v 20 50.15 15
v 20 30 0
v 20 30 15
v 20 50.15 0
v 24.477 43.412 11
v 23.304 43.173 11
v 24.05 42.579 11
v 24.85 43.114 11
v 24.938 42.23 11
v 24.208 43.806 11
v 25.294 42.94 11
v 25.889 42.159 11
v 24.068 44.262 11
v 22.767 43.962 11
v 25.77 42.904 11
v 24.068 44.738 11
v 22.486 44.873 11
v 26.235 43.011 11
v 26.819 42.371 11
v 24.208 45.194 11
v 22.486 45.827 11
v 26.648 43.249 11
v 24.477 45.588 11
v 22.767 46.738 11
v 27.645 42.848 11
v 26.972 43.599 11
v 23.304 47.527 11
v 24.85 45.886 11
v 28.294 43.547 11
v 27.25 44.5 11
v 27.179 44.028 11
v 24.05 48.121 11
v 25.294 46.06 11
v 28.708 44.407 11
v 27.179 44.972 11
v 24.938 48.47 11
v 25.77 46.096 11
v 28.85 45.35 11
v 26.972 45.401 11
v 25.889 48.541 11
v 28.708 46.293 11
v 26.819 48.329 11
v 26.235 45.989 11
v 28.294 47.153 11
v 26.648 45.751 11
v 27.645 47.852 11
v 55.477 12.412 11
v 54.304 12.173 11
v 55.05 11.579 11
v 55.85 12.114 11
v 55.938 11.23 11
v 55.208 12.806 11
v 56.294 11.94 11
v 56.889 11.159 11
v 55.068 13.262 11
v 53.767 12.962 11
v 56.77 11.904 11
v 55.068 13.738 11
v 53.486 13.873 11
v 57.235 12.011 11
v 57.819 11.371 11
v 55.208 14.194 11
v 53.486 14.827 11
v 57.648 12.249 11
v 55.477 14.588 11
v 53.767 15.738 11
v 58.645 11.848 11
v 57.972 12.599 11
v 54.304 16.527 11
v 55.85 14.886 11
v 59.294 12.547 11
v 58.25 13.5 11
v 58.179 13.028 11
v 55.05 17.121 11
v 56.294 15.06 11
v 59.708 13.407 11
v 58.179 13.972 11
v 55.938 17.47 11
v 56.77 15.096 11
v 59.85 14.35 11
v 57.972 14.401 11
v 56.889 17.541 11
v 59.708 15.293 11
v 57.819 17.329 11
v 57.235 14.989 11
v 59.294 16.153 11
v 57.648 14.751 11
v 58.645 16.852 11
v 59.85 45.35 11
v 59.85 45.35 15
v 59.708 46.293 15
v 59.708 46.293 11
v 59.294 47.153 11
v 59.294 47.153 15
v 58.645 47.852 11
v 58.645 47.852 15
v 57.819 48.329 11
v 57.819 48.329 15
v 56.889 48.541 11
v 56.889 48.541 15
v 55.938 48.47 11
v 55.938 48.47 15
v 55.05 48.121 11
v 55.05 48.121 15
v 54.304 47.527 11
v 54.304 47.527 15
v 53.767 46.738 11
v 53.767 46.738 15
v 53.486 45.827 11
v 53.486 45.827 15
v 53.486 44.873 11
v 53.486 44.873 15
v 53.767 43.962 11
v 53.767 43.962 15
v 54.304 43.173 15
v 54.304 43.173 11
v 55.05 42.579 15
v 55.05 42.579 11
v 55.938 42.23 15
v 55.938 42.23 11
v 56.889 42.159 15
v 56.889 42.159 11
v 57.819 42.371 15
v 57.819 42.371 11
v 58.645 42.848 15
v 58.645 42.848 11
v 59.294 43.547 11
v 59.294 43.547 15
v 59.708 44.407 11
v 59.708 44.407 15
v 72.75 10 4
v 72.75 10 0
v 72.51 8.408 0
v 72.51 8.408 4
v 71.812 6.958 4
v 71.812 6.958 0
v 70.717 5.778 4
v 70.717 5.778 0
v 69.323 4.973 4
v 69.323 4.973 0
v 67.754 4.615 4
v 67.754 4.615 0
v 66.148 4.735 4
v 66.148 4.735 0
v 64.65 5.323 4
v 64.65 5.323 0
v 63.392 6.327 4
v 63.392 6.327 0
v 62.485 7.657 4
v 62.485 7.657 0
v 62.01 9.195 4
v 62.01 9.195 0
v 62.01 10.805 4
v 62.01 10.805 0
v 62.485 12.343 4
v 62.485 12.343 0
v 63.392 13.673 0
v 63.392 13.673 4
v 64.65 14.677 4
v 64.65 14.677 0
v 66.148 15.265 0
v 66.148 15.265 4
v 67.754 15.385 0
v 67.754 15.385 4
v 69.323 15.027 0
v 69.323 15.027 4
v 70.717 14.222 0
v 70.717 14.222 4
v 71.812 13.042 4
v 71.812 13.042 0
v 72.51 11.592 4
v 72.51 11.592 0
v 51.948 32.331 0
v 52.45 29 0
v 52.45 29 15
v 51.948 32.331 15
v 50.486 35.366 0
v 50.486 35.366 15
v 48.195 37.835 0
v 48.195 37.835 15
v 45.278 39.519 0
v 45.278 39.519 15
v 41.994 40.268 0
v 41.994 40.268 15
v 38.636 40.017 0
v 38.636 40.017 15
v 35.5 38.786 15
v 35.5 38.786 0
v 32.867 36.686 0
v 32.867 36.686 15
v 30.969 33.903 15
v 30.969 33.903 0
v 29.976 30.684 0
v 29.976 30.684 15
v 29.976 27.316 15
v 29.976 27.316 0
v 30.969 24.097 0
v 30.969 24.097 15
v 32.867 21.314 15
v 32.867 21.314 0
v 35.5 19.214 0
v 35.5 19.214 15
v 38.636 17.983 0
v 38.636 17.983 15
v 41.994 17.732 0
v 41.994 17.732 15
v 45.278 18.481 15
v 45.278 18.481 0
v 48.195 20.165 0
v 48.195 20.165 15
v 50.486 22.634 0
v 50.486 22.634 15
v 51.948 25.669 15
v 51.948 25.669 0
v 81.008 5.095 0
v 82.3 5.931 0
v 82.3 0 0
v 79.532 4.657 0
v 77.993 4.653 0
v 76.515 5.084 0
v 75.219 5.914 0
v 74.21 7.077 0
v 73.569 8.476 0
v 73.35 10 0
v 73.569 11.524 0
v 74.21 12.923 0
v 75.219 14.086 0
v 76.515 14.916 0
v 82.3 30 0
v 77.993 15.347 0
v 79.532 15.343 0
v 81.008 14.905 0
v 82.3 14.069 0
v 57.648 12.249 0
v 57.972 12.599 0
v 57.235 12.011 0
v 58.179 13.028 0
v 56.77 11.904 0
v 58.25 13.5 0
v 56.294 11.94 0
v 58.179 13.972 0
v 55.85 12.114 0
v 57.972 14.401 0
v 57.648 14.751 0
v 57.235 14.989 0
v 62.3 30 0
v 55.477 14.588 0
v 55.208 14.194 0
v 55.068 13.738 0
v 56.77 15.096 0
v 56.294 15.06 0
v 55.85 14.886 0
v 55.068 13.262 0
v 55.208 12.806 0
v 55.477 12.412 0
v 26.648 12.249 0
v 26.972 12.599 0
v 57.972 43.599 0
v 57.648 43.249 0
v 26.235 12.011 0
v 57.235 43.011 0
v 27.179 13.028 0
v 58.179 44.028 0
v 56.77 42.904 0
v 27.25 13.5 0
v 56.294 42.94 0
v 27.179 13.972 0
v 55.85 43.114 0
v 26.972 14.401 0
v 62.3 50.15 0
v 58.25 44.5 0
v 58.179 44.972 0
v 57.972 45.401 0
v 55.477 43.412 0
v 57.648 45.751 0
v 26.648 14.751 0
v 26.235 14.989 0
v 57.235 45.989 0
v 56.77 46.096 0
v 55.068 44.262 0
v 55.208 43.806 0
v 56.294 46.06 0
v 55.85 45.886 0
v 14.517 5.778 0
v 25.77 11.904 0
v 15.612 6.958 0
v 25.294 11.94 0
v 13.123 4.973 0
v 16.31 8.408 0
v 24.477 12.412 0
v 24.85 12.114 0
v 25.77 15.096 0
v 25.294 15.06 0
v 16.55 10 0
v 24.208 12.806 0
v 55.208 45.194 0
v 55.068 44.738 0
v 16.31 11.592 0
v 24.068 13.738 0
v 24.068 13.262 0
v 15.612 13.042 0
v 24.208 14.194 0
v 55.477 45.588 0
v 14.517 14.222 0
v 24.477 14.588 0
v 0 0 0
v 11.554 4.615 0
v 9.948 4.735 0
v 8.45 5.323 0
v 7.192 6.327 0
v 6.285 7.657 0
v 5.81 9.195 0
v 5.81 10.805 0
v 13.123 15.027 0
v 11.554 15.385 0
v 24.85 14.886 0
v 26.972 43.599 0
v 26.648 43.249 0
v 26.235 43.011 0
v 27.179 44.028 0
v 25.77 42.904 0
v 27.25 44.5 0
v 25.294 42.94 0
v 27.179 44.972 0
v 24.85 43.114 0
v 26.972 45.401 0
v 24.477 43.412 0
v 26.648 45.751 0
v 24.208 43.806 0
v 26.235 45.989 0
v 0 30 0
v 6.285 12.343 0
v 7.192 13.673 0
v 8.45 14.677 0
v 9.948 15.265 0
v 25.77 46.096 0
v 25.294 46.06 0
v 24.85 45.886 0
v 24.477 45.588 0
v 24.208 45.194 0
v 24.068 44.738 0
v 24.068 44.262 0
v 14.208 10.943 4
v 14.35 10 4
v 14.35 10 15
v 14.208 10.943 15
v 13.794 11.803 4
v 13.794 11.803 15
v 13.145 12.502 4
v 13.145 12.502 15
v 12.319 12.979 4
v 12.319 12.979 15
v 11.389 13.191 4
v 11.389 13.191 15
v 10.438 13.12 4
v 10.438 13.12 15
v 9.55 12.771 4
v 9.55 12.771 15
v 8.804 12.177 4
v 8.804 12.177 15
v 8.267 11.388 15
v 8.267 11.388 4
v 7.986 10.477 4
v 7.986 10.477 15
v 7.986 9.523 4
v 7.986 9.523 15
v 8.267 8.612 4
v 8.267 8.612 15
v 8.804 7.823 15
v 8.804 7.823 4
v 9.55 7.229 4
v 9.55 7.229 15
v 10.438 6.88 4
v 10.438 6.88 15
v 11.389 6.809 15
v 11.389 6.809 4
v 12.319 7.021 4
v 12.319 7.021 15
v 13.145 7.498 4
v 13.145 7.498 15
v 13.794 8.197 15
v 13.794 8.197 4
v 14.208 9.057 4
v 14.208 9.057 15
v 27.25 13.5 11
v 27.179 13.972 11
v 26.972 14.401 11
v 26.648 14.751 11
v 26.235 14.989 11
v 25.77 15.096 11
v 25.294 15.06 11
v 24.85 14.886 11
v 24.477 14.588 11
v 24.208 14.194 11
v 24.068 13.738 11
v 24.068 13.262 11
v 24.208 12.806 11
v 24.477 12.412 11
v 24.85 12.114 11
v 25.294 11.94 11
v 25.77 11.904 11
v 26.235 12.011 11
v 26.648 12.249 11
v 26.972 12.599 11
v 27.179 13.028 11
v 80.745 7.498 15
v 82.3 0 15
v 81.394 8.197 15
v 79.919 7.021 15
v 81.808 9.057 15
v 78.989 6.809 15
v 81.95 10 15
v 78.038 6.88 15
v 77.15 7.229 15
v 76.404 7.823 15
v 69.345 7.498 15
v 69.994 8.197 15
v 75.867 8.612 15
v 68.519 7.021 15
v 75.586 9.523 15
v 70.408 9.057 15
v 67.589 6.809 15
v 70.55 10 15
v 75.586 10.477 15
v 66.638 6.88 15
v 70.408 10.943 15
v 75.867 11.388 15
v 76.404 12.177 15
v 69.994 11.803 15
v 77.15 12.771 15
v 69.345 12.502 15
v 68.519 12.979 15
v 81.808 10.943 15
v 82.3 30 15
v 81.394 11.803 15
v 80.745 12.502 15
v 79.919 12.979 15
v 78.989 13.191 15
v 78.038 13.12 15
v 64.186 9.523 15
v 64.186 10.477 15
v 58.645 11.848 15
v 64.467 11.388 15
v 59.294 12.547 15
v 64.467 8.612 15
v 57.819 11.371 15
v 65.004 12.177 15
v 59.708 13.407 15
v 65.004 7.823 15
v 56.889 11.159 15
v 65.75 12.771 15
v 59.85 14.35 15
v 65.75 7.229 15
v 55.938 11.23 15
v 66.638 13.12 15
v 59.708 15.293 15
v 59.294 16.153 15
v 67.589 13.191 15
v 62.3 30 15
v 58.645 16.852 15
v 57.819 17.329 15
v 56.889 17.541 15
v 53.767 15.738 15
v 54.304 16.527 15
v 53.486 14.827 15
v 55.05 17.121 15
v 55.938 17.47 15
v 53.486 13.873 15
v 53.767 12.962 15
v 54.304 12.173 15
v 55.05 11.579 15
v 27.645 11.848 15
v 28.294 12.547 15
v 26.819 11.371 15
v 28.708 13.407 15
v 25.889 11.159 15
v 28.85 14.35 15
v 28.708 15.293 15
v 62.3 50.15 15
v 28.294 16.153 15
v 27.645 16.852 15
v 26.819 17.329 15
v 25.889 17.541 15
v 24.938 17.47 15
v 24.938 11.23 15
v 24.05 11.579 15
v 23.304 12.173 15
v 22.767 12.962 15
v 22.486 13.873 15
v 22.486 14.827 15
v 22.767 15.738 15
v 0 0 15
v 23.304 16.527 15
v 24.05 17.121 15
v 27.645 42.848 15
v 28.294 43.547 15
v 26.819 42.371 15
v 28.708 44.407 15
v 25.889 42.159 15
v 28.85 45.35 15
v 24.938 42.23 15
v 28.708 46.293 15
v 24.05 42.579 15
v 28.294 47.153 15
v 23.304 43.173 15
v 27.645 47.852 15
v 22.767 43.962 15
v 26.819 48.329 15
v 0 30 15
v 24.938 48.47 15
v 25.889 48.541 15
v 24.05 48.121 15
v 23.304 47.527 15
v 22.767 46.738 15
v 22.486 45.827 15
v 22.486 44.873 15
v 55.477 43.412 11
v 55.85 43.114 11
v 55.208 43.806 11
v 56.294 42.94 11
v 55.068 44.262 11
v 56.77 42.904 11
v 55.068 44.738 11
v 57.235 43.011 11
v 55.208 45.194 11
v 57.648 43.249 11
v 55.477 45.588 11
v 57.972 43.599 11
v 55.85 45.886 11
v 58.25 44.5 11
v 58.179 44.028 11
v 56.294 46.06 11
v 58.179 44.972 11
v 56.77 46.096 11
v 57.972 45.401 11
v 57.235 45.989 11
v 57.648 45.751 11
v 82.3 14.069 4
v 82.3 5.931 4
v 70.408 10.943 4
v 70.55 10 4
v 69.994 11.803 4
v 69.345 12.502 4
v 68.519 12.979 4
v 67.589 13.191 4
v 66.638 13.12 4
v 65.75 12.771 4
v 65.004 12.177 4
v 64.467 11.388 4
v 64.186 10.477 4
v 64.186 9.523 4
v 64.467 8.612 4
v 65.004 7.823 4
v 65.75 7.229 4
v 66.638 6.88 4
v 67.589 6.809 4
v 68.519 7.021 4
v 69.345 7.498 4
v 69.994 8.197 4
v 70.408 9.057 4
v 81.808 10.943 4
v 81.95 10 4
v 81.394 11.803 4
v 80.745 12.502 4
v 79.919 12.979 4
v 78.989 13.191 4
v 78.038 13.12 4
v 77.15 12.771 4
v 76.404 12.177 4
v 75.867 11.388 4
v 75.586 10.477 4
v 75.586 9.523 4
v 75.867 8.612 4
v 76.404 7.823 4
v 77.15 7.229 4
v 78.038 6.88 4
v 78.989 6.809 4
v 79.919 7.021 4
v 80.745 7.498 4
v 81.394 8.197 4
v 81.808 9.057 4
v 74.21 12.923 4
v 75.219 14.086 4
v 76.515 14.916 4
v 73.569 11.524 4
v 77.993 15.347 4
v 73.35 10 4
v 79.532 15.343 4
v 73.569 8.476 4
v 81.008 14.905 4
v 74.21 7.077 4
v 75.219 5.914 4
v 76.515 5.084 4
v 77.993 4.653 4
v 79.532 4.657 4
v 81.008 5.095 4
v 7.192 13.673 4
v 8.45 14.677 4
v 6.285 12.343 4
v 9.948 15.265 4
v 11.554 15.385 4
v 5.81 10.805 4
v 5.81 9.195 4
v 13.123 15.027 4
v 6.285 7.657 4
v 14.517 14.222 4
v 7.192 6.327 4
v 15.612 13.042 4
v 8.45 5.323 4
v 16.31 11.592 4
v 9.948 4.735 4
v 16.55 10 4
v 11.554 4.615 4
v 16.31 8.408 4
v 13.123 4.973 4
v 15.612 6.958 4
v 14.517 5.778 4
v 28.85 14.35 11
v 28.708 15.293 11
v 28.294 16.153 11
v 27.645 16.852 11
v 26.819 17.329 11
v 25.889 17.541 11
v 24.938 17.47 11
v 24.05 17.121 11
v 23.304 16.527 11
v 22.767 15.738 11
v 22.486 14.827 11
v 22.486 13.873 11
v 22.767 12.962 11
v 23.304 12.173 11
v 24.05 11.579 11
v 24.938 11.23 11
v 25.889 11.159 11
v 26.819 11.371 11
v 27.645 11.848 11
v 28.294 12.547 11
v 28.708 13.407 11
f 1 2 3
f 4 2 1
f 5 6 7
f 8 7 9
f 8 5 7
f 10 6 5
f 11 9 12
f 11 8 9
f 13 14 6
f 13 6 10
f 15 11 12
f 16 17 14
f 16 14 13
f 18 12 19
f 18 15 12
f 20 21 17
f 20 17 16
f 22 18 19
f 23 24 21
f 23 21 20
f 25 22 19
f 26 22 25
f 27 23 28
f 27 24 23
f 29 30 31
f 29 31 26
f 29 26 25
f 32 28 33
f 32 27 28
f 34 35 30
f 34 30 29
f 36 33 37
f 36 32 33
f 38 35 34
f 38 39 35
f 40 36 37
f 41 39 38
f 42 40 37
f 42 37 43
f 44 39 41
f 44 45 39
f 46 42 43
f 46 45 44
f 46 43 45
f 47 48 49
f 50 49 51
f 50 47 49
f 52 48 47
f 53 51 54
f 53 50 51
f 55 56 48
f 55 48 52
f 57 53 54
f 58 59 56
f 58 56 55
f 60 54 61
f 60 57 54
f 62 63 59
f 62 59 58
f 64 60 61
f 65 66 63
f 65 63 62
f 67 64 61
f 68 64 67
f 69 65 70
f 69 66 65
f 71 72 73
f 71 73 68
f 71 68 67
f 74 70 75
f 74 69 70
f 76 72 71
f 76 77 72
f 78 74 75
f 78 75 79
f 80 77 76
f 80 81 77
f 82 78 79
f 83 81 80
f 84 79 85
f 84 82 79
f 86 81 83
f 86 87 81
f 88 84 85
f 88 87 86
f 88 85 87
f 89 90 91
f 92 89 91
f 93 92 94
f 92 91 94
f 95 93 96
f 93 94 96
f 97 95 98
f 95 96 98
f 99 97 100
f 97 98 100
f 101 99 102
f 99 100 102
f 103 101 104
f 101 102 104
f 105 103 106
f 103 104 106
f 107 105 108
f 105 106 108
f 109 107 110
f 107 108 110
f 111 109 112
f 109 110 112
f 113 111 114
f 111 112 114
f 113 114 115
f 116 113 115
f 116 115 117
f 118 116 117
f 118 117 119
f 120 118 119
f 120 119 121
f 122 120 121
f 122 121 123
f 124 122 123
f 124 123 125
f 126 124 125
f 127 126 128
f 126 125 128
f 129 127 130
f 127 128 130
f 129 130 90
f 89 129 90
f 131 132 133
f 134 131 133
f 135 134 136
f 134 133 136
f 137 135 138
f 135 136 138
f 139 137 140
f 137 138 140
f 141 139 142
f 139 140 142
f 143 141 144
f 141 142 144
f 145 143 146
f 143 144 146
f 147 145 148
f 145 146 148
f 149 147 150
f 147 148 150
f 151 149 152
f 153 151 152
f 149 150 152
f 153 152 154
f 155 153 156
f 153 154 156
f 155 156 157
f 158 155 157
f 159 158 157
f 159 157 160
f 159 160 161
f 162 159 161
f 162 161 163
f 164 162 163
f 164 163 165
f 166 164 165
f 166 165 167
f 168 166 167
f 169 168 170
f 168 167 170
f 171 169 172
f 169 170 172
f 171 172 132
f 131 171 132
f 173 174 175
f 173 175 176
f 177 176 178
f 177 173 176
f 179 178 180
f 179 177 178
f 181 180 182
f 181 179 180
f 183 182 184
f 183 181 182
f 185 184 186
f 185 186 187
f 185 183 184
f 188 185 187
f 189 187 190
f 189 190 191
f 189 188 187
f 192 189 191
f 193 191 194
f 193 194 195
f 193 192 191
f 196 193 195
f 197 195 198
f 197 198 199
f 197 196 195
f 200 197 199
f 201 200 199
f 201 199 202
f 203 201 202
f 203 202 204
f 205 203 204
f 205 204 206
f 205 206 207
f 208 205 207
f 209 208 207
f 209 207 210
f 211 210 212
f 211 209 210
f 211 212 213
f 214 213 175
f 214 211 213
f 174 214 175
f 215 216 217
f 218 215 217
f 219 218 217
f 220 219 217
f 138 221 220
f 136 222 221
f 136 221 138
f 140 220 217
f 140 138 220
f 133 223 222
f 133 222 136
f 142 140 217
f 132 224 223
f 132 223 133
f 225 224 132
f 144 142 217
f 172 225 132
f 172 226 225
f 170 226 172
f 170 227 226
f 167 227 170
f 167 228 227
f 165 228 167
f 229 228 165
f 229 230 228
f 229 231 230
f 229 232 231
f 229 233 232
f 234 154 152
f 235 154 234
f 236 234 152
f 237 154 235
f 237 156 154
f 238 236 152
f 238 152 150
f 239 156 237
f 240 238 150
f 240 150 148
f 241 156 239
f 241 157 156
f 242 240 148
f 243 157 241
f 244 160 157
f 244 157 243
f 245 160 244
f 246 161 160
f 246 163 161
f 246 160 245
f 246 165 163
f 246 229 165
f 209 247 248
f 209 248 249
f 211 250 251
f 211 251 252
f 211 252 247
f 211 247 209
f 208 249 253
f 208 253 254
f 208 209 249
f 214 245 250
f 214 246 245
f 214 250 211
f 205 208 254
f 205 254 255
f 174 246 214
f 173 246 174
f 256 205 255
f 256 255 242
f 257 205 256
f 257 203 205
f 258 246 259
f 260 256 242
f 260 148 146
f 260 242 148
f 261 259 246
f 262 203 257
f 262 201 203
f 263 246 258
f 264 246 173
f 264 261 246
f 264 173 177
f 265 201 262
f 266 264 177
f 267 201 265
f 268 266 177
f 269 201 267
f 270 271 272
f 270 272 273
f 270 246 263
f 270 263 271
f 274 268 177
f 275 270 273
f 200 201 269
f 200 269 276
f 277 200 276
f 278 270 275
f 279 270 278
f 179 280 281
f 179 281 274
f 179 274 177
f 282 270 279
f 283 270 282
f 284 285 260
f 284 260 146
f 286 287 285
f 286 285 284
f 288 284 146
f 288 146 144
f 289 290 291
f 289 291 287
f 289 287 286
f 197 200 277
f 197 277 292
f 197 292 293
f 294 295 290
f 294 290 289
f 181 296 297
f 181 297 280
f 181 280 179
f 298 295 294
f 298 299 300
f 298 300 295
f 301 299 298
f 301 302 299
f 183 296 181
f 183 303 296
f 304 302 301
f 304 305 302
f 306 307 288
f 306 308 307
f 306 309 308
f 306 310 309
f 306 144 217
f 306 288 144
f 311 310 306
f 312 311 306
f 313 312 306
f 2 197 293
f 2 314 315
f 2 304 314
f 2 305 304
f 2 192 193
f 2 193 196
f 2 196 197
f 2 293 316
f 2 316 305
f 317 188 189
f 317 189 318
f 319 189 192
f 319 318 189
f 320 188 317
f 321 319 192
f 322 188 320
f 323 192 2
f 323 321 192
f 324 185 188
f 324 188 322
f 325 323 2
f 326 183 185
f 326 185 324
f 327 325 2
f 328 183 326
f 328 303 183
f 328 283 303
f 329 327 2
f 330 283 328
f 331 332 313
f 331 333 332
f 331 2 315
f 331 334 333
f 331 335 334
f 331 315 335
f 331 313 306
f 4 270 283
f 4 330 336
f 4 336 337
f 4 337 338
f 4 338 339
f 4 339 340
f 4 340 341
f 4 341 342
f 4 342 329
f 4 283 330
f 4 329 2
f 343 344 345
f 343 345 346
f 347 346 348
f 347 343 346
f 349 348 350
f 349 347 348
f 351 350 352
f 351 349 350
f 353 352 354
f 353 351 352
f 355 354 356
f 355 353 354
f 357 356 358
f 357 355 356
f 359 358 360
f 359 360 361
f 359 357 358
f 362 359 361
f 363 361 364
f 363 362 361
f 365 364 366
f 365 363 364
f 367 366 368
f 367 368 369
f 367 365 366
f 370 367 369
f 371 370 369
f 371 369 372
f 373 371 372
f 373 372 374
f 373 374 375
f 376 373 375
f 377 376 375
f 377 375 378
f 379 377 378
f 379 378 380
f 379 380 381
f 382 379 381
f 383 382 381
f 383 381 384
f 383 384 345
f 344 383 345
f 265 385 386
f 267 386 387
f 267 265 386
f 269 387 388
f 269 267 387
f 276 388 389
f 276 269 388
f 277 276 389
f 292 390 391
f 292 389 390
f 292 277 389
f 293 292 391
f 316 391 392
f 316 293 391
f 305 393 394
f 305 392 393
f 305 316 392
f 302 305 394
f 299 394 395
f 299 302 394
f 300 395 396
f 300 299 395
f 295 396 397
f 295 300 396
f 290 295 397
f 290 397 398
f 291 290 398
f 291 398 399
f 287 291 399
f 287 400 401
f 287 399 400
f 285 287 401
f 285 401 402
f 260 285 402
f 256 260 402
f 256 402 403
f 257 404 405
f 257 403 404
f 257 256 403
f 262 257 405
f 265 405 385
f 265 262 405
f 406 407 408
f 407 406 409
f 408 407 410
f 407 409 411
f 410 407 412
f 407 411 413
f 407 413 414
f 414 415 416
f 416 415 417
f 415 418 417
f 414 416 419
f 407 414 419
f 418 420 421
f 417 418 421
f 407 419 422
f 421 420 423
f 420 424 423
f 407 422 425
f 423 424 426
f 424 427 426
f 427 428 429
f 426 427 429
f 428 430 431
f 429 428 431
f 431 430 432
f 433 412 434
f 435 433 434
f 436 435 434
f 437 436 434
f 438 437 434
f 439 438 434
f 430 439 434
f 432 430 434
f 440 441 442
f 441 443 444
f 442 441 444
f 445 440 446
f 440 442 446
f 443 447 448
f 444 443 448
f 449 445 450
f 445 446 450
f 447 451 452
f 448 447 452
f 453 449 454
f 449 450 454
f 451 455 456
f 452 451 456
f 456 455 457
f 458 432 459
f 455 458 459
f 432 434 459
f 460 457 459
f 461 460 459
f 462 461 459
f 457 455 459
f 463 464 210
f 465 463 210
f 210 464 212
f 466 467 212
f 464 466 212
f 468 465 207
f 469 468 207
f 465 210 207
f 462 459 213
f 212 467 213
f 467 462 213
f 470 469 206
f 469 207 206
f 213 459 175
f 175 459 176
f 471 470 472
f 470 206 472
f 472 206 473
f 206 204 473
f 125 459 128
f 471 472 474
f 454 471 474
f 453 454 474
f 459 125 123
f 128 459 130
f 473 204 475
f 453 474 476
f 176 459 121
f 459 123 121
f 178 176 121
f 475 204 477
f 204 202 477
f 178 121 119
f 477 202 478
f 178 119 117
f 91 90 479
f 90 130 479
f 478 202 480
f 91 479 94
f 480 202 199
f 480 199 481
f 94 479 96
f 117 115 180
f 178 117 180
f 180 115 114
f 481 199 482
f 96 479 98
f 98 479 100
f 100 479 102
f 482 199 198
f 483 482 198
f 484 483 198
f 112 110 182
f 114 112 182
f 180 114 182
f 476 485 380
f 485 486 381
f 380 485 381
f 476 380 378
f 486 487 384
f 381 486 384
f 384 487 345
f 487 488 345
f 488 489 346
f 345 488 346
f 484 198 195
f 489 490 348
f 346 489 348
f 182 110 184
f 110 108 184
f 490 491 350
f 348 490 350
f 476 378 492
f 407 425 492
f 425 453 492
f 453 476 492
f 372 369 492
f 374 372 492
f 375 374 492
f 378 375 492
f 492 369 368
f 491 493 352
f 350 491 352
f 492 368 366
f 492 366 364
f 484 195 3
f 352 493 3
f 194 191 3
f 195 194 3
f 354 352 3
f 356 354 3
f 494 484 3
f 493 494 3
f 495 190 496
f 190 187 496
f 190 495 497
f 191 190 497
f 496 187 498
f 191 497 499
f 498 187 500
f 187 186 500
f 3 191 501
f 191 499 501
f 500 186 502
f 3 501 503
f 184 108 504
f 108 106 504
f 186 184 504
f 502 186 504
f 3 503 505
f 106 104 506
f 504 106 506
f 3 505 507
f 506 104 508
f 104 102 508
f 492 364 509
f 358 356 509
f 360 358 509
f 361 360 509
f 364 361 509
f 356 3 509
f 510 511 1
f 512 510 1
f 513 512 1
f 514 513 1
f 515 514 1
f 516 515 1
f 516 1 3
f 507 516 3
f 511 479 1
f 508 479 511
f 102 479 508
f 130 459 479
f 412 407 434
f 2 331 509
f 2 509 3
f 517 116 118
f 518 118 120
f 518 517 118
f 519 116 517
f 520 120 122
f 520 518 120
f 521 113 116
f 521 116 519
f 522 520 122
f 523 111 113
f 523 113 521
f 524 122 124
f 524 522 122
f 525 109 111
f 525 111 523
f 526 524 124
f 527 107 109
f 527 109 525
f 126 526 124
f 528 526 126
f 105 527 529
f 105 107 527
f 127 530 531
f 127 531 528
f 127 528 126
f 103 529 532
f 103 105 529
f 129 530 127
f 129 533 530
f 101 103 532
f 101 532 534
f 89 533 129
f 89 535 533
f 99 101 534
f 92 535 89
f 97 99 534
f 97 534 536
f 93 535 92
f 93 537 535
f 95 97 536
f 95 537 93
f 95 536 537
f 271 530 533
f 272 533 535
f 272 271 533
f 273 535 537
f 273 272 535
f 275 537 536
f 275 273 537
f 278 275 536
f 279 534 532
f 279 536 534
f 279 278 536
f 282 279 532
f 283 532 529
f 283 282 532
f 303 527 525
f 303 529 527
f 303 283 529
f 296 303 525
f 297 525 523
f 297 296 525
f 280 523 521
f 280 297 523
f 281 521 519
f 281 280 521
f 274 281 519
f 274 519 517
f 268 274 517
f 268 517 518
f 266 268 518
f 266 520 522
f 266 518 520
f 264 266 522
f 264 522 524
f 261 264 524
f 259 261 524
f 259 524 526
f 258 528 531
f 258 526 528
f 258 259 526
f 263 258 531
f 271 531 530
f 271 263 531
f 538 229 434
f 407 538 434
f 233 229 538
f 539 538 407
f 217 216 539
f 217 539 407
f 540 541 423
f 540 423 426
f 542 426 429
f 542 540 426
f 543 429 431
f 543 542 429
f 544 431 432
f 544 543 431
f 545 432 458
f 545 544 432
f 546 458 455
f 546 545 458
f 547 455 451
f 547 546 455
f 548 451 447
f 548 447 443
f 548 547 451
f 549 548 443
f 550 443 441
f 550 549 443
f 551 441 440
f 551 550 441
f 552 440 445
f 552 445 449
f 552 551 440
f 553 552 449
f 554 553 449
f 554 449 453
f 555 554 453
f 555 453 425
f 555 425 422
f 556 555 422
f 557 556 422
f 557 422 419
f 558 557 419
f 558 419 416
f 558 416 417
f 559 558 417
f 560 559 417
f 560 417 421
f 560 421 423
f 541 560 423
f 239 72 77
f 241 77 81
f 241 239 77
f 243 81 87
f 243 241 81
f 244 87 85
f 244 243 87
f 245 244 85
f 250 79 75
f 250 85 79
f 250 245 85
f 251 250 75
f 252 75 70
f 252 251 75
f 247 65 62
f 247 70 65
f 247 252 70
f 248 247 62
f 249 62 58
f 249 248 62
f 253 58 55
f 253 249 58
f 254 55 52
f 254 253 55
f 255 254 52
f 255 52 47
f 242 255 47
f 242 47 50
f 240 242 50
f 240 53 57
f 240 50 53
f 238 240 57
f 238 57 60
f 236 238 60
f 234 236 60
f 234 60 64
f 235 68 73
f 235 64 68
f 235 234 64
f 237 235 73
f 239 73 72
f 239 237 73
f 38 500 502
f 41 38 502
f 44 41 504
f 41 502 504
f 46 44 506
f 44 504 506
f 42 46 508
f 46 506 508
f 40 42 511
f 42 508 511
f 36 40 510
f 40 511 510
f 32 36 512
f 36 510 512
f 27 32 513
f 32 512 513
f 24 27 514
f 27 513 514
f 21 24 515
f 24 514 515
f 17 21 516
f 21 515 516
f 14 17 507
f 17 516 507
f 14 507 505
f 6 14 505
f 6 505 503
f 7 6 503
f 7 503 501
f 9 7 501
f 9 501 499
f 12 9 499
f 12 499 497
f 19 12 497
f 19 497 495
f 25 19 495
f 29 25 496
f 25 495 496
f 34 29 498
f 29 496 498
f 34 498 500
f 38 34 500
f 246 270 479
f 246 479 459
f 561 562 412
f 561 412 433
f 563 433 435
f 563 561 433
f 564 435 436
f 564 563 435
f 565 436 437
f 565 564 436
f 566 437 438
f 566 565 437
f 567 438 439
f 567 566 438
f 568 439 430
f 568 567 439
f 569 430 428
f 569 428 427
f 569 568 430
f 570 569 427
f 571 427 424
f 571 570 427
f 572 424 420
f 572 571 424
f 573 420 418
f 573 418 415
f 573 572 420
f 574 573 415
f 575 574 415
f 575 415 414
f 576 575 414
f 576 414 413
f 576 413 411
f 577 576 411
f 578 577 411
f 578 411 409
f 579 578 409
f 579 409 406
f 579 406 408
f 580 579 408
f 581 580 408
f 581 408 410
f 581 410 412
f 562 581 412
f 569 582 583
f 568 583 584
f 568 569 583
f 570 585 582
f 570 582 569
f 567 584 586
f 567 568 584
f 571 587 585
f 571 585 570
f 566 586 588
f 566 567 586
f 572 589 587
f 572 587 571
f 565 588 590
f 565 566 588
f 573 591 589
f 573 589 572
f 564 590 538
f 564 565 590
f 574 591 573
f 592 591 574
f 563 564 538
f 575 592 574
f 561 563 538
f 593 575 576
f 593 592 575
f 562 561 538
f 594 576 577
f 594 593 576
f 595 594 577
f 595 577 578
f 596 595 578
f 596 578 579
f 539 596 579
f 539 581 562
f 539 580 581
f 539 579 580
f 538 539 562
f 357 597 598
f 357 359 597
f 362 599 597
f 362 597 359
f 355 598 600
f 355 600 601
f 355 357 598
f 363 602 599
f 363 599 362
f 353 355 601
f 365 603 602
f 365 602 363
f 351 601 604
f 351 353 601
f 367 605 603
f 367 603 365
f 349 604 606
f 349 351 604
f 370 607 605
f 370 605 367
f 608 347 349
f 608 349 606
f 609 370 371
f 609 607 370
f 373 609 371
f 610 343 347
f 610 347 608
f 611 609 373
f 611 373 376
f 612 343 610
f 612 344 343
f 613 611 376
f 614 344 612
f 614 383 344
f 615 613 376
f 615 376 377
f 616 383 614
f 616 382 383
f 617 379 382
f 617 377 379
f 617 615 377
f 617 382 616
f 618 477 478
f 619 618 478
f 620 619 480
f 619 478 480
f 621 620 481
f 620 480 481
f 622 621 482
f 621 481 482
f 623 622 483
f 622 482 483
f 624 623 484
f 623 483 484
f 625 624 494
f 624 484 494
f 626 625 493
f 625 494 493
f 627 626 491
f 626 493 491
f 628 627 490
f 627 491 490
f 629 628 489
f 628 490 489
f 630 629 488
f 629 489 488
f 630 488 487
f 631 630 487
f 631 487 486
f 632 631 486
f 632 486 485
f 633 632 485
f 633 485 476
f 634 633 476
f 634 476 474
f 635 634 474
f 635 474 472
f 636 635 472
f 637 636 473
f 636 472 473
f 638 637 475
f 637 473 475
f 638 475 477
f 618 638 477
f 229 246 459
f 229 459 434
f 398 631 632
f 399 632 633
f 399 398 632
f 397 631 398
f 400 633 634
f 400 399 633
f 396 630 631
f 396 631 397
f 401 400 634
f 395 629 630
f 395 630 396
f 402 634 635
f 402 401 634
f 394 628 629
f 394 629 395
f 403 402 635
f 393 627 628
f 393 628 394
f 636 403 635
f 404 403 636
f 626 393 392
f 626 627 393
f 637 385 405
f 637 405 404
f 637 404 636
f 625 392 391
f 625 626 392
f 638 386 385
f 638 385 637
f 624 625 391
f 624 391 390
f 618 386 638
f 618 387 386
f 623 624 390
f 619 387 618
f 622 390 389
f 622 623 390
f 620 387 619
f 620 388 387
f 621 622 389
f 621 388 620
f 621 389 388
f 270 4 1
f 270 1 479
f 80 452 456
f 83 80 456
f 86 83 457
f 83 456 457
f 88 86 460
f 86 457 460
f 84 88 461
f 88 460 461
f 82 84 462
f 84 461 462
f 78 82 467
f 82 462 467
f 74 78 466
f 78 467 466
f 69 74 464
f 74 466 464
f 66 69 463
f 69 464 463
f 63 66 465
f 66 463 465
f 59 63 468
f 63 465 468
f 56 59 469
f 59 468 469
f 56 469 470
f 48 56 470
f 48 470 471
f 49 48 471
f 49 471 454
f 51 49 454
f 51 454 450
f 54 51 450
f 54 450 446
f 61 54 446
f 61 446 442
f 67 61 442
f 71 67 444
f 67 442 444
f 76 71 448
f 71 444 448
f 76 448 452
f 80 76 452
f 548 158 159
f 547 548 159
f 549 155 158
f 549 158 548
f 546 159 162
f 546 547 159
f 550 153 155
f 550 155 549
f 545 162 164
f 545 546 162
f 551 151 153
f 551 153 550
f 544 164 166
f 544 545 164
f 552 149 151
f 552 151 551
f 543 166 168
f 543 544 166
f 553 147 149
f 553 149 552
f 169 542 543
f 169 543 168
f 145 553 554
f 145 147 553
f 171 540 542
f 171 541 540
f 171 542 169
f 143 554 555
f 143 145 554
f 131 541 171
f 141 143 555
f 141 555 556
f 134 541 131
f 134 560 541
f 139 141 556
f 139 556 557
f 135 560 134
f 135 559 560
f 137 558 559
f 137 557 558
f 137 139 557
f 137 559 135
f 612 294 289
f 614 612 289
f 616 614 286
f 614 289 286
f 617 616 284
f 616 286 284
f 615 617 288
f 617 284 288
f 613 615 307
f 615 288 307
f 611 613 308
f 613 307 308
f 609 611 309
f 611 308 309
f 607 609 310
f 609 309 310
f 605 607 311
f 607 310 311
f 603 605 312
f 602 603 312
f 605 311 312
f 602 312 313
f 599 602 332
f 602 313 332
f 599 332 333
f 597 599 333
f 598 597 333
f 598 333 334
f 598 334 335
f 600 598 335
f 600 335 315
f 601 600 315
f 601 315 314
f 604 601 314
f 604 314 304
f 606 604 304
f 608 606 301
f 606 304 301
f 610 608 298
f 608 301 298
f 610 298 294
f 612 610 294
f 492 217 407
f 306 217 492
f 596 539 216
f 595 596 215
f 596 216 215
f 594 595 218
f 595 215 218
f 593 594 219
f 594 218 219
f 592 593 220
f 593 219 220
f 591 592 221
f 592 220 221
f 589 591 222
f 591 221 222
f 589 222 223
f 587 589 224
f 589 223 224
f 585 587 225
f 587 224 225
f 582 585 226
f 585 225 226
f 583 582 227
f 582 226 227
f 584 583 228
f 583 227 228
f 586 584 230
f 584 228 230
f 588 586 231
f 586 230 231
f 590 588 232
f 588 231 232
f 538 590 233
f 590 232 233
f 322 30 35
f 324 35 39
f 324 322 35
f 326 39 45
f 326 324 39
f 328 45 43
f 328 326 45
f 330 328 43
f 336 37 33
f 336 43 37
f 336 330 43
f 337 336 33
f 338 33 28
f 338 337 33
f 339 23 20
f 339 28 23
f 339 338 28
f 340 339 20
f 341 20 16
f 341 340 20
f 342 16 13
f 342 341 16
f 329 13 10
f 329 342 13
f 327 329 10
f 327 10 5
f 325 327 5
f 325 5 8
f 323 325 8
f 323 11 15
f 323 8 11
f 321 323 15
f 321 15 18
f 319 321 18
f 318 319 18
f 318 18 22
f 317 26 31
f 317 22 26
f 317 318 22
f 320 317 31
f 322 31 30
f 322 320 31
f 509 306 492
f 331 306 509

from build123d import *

# Parameters (mm, degrees)
SKETCH_R        = 11.3
SKETCH_R_2      = 1.6
SKETCH_R_3      = 3.2
PAD_DEPTH       = 15
SKETCH001_R     = 3.2
POCKET_DEPTH    = 4
SKETCH002_R     = 5.4
POCKET001_DEPTH = 4


with BuildPart() as part:
    # Sketch → Pad (new body)
    with BuildSketch(Plane.XY):
        Polygon((20, 30), (20, 50.15), (62.3, 50.15), (62.3, 30), (82.3, 30), (82.3, 0), (0, 0), (0, 30), align=None)
        with Locations((41.15, 29)):
            Circle(SKETCH_R, mode=Mode.SUBTRACT)
        with Locations((25.65, 44.5)):
            Circle(SKETCH_R_2, mode=Mode.SUBTRACT)
        with Locations((25.65, 13.5)):
            Circle(SKETCH_R_2, mode=Mode.SUBTRACT)
        with Locations((56.65, 44.5)):
            Circle(SKETCH_R_2, mode=Mode.SUBTRACT)
        with Locations((56.65, 13.5)):
            Circle(SKETCH_R_2, mode=Mode.SUBTRACT)
        with Locations((11.15, 10)):
            Circle(SKETCH_R_3, mode=Mode.SUBTRACT)
        with Locations((67.35, 10)):
            Circle(SKETCH_R_3, mode=Mode.SUBTRACT)
        with Locations((78.75, 10)):
            Circle(SKETCH_R_3, mode=Mode.SUBTRACT)
    extrude(amount=PAD_DEPTH)

    # Sketch001 (on Face18 of Pad) → Pocket (cut)
    with BuildSketch(Plane.XY.offset(15)):
        with Locations((25.65, 45.35)):
            Circle(SKETCH001_R)
        with Locations((56.65, 45.35)):
            Circle(SKETCH001_R)
        with Locations((56.65, 14.35)):
            Circle(SKETCH001_R)
        with Locations((25.65, 14.35)):
            Circle(SKETCH001_R)
    extrude(amount=-POCKET_DEPTH, mode=Mode.SUBTRACT)

    # Sketch002 (on Face4 of Pocket) → Pocket001 (cut)
    with BuildSketch(Plane(origin=(0, 0, 0), x_dir=(1, 0, 0), z_dir=(0, 0, -1))):
        with Locations((11.15, -10)):
            Circle(SKETCH002_R)
        with Locations((67.35, -10)):
            Circle(SKETCH002_R)
        with Locations((78.75, -10)):
            Circle(SKETCH002_R)
    extrude(amount=-POCKET001_DEPTH, mode=Mode.SUBTRACT)


solid = part.part
